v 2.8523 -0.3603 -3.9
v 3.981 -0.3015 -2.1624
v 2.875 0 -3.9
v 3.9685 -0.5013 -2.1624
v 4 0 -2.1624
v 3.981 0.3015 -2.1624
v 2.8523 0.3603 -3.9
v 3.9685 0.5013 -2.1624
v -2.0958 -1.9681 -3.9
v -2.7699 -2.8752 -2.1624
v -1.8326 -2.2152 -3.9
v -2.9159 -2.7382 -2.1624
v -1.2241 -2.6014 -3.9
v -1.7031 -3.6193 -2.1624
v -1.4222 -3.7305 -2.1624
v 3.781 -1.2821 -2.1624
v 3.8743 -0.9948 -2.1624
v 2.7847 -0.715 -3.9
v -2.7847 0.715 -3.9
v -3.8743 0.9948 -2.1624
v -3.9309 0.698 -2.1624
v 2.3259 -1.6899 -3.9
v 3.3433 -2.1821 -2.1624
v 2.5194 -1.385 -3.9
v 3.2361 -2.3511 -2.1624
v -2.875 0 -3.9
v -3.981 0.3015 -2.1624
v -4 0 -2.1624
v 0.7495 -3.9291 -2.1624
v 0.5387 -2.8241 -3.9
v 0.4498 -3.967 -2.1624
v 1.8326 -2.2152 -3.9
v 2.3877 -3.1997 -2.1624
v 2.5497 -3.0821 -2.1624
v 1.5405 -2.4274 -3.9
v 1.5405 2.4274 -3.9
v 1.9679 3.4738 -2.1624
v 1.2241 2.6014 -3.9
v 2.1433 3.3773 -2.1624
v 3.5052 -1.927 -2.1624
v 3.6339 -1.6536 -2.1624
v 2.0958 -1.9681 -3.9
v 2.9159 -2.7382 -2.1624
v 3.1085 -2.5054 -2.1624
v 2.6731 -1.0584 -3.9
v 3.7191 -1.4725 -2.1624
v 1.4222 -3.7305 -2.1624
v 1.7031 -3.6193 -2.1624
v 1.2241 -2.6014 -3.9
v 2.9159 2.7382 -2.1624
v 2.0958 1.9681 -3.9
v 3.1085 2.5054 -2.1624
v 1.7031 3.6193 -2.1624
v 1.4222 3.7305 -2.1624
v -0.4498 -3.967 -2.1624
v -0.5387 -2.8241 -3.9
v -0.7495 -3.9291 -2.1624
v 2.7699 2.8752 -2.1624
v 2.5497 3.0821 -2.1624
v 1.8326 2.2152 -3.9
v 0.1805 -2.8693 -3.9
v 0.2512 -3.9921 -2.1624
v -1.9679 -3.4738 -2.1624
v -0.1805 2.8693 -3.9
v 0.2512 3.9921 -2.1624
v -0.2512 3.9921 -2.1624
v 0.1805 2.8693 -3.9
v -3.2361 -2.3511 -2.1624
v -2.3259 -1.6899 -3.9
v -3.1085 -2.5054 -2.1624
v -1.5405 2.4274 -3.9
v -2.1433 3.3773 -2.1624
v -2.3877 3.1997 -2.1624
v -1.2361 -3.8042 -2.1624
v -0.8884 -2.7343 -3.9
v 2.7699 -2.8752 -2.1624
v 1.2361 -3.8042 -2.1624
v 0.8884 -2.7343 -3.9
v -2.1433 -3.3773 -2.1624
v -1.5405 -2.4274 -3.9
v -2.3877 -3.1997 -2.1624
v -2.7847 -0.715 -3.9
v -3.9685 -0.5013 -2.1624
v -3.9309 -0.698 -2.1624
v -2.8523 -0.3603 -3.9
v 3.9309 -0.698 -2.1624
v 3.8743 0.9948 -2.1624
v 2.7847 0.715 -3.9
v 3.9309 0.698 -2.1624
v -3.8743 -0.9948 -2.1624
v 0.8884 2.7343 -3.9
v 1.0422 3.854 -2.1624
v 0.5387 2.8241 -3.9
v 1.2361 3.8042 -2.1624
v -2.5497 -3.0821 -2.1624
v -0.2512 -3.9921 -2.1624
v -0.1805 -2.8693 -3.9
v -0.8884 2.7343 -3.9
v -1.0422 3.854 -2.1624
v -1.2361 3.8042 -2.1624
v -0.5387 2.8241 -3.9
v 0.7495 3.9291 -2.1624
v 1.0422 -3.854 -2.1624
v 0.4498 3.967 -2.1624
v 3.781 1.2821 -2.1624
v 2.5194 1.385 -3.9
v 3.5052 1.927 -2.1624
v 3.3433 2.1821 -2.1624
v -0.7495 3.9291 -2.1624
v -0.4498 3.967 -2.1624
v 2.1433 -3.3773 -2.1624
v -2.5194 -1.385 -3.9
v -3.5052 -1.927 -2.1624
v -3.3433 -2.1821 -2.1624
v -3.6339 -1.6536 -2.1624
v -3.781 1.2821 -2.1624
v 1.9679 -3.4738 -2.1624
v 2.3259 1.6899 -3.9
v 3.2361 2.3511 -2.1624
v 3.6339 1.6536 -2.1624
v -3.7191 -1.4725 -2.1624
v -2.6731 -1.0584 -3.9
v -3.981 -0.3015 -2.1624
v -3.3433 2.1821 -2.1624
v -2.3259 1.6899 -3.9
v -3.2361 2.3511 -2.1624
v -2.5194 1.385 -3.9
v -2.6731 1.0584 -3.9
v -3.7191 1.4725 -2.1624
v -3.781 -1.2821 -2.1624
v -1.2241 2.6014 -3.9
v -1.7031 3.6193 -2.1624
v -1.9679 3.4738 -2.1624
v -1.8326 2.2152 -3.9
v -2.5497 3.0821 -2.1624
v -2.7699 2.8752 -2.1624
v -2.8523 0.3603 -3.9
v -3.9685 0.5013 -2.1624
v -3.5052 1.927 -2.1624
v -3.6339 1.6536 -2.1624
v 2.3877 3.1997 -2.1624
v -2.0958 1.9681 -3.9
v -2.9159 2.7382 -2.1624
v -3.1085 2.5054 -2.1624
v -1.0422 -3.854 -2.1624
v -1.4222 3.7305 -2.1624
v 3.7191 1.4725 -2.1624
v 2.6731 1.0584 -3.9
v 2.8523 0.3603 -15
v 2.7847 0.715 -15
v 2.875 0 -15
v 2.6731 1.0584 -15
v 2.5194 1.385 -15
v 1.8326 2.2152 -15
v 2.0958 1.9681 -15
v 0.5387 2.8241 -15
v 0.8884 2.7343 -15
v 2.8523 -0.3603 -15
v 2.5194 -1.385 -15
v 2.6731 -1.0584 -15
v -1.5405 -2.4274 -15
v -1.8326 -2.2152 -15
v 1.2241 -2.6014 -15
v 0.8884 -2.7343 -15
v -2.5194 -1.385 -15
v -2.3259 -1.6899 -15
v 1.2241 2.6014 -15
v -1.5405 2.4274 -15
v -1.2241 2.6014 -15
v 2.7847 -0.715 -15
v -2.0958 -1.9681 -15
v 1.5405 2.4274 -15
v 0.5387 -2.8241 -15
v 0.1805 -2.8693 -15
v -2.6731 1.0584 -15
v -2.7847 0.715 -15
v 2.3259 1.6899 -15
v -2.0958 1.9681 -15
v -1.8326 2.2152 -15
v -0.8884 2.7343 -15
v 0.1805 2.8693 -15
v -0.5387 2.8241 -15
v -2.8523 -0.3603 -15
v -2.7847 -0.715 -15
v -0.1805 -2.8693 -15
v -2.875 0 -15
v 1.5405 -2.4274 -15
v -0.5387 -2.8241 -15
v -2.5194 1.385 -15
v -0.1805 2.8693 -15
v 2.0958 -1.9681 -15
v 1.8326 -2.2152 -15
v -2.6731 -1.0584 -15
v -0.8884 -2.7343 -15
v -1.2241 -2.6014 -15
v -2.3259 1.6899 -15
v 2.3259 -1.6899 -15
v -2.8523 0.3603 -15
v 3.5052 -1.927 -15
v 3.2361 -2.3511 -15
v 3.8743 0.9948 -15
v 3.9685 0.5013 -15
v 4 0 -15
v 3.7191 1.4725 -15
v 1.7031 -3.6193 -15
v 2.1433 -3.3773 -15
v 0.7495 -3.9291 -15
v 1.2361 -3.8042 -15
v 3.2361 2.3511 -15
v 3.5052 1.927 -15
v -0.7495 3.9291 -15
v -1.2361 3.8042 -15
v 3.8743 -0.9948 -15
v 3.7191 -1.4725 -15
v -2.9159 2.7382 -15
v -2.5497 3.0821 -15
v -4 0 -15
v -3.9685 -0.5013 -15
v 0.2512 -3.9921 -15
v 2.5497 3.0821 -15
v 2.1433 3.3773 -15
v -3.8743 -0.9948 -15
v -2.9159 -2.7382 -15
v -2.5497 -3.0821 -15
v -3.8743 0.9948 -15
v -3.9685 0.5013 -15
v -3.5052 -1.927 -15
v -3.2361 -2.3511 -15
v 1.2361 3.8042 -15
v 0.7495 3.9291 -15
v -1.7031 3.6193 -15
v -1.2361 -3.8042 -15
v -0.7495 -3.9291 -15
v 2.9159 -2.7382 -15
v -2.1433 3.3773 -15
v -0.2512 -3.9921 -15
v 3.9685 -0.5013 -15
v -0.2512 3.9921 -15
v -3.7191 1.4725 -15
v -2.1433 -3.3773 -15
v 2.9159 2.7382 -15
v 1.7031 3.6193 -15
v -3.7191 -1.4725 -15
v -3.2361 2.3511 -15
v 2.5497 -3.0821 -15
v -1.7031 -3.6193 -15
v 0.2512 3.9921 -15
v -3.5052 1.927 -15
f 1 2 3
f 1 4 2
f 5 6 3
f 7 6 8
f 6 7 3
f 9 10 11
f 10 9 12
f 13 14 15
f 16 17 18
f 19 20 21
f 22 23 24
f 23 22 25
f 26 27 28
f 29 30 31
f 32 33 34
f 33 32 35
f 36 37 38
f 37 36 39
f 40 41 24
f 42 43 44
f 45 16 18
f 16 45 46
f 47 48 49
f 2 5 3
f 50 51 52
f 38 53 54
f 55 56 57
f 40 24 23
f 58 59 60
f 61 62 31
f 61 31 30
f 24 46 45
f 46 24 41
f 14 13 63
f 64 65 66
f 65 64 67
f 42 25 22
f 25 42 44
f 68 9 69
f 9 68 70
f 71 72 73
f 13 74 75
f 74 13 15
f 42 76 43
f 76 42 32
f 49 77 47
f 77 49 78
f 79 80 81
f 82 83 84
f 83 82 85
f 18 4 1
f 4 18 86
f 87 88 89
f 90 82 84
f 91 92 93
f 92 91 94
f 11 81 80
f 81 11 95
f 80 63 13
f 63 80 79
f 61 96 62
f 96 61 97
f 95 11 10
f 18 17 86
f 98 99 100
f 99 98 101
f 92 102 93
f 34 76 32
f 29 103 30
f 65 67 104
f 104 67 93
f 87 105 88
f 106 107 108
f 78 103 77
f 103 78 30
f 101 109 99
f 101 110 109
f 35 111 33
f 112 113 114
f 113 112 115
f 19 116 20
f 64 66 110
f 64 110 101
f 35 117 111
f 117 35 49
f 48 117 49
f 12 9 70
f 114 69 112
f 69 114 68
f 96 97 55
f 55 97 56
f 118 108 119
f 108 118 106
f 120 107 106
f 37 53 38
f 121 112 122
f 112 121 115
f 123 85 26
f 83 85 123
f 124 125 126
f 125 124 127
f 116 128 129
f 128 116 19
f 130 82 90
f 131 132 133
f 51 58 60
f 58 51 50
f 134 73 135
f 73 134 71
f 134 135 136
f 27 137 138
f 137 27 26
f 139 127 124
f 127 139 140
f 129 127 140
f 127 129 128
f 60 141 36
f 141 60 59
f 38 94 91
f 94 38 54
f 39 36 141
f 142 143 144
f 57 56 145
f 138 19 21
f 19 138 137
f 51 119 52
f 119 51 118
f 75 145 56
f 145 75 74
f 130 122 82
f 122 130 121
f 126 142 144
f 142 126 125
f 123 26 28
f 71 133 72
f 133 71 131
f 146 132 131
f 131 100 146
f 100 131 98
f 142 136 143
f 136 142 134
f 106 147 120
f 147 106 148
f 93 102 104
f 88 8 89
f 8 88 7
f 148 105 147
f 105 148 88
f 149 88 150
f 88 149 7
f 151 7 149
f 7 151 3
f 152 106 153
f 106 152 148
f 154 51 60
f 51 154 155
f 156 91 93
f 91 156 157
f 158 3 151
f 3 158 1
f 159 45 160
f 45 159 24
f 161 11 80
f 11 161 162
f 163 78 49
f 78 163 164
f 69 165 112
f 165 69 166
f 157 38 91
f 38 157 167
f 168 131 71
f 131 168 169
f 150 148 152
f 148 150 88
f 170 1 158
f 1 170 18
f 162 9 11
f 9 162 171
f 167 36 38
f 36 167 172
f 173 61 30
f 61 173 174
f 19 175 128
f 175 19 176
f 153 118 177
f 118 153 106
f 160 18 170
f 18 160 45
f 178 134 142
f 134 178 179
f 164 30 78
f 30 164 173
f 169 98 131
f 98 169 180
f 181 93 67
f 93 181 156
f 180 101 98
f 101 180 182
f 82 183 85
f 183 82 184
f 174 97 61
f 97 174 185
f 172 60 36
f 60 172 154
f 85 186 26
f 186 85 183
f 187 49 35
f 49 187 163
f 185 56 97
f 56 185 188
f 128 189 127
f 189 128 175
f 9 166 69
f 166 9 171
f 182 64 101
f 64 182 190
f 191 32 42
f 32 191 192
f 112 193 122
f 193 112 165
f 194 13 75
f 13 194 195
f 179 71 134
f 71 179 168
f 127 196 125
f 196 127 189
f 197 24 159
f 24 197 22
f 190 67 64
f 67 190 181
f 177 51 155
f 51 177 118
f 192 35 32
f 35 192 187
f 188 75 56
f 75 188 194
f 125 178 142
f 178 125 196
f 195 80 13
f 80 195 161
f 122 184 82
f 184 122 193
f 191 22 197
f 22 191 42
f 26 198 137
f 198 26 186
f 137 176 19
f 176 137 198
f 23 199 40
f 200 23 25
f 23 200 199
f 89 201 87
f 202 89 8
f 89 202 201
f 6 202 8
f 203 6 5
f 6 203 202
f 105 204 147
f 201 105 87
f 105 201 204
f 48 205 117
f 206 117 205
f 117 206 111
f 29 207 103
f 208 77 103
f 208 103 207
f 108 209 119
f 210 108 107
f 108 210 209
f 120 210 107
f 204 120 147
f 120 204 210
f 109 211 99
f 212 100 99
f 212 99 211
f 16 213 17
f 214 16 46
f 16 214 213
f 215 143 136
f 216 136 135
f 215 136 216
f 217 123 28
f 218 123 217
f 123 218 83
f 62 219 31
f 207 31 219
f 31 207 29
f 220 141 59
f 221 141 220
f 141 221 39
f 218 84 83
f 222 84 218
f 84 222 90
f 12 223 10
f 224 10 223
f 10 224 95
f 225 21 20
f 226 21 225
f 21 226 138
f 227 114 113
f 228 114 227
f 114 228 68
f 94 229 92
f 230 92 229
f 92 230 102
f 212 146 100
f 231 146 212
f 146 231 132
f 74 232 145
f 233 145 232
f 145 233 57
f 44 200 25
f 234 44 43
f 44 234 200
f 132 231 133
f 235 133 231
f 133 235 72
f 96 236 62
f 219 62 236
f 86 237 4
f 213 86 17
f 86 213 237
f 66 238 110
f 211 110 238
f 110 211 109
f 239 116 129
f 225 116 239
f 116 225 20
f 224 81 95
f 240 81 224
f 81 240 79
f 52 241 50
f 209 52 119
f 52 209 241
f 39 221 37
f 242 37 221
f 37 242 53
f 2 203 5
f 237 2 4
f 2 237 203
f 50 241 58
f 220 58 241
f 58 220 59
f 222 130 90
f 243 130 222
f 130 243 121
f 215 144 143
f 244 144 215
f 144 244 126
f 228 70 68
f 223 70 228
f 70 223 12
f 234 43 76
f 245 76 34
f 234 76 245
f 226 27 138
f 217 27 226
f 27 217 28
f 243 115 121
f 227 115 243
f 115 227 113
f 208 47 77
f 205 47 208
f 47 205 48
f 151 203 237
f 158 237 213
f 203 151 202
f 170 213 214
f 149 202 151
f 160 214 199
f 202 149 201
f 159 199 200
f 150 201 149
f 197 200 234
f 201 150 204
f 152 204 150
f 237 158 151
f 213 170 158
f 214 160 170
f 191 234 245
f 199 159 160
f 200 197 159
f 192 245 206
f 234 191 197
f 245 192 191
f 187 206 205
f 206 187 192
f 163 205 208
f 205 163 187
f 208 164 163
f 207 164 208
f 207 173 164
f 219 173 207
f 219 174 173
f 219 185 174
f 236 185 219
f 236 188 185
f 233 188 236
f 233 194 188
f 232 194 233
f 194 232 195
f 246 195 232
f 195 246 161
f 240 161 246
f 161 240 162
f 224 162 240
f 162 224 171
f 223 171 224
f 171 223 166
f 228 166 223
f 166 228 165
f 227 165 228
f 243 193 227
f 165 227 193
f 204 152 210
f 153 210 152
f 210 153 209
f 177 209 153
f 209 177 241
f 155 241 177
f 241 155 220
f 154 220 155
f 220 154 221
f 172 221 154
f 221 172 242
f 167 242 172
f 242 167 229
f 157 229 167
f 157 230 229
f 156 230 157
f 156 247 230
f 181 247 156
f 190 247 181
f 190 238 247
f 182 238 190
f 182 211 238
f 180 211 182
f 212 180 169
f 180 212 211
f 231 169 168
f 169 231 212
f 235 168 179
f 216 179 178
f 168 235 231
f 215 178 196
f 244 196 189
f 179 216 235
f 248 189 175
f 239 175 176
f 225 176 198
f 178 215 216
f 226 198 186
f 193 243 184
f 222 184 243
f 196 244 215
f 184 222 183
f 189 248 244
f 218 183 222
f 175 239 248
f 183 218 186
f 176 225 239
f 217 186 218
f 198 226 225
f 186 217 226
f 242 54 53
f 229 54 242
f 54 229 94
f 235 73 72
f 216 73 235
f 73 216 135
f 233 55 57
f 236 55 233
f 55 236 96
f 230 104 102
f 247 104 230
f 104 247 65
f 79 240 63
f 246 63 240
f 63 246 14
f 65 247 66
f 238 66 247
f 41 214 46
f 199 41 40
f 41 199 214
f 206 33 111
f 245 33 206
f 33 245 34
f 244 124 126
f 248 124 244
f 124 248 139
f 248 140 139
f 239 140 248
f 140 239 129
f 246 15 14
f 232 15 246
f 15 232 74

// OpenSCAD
$fn = 50;

difference() {
	union() {
		translate(v = [0, 0, -15.0]) {
			cylinder(h = 15, r = 4.0);
		}
	}
	union() {
		translate(v = [0, 0, 0]) {
			rotate(a = [0, 0, 0]) {
				difference() {
					union() {
						translate(v = [0, 0, -18.0]) {
							cylinder(h = 18, r = 2.6);
						}
						translate(v = [0, 0, -3.9]) {
							cylinder(h = 3.9, r1 = 2.875, r2 = 5.4);
						}
						translate(v = [0, 0, -18.0]) {
							cylinder(h = 18, r = 2.875);
						}
						translate(v = [0, 0, -18.0]) {
							cylinder(h = 18, r = 2.6);
						}
					}
					union();
				}
			}
		}
	}
}
